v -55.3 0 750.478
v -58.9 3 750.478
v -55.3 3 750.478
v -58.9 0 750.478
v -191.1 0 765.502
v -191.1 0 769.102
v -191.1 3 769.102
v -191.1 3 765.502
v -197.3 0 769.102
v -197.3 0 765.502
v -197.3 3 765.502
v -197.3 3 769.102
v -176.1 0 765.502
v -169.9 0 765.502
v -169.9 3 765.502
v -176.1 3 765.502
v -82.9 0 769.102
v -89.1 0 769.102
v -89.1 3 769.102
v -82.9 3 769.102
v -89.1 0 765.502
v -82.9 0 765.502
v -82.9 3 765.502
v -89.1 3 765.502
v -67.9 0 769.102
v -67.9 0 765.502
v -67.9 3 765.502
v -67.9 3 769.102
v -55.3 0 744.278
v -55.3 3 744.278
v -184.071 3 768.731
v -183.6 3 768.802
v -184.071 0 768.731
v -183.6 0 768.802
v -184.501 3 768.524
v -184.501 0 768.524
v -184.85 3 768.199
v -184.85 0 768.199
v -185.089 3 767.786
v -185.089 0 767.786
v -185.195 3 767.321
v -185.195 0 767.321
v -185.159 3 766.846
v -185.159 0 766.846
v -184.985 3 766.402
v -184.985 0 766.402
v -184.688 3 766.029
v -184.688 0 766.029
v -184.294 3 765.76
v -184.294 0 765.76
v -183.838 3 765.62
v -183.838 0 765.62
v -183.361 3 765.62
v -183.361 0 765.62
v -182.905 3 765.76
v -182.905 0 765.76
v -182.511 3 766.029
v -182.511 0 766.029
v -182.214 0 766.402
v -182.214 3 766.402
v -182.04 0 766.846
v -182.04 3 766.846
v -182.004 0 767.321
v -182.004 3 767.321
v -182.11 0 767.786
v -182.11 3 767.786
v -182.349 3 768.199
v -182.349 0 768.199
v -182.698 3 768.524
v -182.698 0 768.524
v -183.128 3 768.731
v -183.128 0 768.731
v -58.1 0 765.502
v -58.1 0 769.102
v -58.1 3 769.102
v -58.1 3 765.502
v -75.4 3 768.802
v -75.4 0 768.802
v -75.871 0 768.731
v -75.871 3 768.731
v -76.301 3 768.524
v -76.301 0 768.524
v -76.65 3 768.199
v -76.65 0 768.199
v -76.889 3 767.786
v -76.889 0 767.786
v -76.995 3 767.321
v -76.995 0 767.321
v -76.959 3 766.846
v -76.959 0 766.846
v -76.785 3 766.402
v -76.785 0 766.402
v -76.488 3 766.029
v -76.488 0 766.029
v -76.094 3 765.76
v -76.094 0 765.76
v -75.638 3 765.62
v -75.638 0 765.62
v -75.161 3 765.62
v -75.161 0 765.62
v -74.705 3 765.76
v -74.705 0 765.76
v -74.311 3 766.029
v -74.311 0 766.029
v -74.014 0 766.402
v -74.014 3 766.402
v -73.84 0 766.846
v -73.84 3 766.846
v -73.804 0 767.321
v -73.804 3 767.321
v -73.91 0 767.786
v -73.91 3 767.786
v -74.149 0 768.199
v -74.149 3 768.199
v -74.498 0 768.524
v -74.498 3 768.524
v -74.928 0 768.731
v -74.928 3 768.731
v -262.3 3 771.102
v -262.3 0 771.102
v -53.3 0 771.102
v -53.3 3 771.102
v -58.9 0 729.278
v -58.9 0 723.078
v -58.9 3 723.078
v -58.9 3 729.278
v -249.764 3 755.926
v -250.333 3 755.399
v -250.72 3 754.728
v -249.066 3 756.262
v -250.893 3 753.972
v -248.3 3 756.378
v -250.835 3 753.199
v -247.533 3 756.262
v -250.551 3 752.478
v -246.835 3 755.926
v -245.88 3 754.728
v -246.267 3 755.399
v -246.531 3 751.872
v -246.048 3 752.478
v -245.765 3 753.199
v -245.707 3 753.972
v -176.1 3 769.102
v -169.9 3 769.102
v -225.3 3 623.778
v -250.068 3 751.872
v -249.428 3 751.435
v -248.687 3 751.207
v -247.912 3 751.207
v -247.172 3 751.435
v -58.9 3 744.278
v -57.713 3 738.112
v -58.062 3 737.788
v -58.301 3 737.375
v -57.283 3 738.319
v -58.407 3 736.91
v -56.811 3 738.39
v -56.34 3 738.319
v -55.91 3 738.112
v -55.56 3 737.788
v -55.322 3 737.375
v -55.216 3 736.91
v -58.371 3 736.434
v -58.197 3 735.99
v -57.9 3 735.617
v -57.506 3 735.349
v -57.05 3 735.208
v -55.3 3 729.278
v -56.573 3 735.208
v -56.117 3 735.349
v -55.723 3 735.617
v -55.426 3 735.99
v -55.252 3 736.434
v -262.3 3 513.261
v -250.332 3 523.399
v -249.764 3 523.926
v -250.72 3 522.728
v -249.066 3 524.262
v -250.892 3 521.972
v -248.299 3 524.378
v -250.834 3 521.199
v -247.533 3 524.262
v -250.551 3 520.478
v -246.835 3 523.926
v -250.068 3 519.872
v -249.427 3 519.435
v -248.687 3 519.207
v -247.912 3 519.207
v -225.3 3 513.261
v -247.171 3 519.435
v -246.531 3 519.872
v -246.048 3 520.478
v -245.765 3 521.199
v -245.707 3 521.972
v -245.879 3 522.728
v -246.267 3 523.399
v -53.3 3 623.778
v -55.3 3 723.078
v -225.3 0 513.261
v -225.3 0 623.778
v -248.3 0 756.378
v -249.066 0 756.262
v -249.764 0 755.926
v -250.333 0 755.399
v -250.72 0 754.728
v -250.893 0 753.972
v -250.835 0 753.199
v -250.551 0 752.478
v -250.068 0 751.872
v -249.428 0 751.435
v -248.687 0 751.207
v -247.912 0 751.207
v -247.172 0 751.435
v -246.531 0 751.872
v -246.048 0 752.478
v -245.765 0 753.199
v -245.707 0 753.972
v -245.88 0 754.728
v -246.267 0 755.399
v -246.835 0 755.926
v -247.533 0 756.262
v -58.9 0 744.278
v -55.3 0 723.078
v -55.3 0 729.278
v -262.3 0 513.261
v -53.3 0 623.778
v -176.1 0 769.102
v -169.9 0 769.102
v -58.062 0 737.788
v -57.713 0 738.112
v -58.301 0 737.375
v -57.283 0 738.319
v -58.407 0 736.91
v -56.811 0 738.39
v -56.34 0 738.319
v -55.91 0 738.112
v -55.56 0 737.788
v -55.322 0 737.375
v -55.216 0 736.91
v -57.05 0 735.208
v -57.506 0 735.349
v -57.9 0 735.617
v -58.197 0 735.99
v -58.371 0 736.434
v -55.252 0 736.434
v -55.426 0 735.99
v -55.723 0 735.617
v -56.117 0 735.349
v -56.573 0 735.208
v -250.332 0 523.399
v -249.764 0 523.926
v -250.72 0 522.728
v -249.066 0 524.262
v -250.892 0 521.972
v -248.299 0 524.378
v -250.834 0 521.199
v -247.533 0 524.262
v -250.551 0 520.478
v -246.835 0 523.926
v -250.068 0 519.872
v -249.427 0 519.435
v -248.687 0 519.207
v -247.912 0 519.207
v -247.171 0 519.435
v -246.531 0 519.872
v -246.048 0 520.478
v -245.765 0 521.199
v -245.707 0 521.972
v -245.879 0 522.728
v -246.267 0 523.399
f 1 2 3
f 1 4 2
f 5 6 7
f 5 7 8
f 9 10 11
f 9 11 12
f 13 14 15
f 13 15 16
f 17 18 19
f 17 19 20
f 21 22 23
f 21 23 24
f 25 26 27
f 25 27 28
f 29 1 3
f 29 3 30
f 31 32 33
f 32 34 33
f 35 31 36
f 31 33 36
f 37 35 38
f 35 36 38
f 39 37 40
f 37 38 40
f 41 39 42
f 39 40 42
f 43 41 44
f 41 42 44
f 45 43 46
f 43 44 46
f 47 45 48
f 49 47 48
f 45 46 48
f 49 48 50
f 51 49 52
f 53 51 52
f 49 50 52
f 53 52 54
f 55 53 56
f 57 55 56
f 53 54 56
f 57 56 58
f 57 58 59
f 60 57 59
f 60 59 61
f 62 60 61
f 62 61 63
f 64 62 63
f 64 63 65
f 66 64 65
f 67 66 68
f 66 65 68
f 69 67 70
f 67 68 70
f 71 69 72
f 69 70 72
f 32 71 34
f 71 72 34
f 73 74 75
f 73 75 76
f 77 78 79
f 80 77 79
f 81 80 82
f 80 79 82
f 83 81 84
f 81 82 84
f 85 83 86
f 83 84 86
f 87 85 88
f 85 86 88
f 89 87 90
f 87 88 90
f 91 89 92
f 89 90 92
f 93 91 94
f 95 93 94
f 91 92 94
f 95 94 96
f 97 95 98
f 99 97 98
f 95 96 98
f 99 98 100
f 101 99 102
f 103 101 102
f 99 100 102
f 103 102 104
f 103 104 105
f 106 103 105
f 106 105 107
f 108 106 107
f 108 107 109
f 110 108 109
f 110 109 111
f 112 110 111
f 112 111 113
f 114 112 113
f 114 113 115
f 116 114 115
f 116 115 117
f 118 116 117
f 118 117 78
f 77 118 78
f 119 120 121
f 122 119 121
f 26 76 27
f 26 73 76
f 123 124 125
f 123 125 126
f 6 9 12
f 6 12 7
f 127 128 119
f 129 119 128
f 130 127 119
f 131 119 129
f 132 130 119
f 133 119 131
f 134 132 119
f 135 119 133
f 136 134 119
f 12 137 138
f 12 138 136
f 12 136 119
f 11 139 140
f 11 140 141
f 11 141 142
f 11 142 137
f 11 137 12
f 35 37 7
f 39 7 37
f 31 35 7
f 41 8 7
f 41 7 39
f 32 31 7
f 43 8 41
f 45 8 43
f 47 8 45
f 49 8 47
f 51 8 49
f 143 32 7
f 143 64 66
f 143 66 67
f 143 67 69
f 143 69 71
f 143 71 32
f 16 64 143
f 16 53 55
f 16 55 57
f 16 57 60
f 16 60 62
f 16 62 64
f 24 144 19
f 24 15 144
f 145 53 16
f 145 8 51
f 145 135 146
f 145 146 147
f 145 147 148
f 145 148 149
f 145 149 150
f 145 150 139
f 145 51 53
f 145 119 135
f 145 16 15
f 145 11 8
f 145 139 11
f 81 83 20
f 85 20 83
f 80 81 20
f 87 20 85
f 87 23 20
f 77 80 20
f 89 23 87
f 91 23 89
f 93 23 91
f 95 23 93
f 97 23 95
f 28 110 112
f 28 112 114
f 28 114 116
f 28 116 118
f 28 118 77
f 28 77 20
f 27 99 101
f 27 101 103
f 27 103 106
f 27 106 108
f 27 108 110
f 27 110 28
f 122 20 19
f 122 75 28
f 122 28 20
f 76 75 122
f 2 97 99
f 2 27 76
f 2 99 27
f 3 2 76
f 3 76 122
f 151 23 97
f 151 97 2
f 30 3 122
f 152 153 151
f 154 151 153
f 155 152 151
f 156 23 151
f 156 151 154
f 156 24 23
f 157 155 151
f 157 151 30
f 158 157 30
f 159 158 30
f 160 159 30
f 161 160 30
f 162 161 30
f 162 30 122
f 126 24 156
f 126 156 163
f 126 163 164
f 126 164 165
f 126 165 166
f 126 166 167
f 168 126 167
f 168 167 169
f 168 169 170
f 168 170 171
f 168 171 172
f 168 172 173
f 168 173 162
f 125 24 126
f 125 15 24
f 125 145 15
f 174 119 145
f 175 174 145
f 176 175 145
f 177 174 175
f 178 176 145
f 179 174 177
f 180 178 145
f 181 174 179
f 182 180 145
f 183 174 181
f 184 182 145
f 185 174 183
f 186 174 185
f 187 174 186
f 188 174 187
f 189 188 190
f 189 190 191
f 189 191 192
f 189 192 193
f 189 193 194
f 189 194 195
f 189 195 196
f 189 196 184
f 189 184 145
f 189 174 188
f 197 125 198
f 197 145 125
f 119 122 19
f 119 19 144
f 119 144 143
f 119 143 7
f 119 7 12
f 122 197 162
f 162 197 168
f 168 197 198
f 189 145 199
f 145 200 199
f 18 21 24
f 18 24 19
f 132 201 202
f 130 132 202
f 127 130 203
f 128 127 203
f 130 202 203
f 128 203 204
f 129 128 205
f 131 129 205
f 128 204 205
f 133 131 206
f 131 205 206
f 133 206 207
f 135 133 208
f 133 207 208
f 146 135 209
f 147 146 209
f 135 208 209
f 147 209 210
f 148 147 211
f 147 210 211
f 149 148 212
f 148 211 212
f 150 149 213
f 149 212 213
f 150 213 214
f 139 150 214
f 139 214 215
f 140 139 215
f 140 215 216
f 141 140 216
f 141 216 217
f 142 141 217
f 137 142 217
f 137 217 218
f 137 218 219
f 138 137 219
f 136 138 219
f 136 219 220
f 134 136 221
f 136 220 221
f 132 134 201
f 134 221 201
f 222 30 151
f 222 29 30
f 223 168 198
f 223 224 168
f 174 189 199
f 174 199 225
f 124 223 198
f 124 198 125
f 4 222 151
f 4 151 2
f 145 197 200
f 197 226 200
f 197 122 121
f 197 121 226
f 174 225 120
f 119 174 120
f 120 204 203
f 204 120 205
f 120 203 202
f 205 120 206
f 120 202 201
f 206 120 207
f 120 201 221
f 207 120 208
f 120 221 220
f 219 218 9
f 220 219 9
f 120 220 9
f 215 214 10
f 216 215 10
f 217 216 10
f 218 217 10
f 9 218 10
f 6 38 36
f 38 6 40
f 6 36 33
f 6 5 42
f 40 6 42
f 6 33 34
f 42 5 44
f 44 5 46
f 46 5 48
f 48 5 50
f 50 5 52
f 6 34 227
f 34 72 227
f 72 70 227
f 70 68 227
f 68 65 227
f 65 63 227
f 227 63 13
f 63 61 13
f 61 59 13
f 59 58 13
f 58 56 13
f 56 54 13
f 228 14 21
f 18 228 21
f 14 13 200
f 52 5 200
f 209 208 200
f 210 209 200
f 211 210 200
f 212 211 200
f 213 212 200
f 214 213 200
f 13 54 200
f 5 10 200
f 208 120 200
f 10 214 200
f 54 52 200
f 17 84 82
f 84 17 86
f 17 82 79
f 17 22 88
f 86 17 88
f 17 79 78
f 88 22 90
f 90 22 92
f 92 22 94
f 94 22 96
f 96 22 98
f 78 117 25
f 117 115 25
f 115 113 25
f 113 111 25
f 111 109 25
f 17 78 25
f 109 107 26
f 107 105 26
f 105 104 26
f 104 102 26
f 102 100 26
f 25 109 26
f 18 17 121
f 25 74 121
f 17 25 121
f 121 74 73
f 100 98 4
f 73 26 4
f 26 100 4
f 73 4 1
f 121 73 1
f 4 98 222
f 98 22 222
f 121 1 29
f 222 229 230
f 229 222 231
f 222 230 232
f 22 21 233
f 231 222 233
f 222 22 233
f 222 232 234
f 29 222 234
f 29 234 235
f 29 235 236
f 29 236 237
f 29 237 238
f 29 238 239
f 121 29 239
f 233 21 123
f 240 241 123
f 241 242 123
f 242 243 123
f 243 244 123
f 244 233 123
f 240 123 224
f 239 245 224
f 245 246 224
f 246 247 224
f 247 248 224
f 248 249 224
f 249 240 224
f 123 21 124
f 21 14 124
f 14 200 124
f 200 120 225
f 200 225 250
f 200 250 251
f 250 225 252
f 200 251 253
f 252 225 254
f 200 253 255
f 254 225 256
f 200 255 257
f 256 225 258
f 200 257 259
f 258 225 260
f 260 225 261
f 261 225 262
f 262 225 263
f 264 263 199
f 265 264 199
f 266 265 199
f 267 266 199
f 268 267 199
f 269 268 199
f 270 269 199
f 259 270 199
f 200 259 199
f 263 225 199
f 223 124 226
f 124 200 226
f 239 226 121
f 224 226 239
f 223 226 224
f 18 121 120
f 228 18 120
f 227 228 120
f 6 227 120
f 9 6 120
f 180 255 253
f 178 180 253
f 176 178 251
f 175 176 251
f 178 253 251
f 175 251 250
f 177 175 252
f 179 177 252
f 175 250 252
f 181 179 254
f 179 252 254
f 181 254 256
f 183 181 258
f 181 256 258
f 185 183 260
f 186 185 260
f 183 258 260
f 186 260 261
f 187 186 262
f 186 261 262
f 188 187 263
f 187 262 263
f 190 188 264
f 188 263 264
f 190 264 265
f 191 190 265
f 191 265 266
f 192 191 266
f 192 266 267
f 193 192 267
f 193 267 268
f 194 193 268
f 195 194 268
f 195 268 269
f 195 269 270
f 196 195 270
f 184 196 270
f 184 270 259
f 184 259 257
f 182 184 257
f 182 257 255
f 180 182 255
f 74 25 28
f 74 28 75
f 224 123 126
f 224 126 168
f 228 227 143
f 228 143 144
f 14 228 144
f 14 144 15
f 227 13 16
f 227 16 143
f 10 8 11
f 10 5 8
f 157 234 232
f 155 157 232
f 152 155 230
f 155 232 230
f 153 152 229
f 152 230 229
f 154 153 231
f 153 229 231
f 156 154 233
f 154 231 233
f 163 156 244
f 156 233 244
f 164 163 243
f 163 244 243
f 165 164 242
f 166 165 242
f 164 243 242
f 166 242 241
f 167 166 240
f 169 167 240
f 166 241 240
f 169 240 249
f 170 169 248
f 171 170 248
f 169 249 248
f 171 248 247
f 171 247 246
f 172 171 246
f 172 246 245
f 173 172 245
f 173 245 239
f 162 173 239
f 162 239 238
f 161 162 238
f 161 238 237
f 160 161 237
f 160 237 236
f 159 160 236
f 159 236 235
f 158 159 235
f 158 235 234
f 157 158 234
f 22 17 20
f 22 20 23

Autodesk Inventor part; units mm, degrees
ref_plane "YZ Plane" through (0, 0, 0) normal (1, 0, 0) x (0, 1, 0)
ref_plane "XZ Plane" through (0, 0, 0) normal (0, 1, 0) x (-1, 0, 0)
ref_plane "XY Plane" through (0, 0, 0) normal (0, 0, 1) x (1, 0, 0)
sketch "Sketch1" plane through (0, 0, 0) normal (0, 1, 0) x (-1, 0, 0)
  line L0 (55.2995, 771.1017) -> (53.2995, 771.1017)
  line L1 (53.2995, 771.1017) -> (53.2995, 769.1016)
  line L2 (53.2995, 769.1016) -> (53.2995, 481.7779)
  line L3 (53.2995, 481.7779) -> (65.4836, 481.7779)
  line L4 (65.4836, 481.7779) -> (65.4836, 475.7779)
  line L5 (65.4836, 475.7779) -> (70.4836, 475.7779)
  line L6 (70.4836, 475.7779) -> (70.4836, 481.7779)
  line L7 (70.4836, 481.7779) -> (71.2995, 481.7779)
  line L8 (71.2995, 481.7779) -> (71.2995, 623.7779)
  line L9 (71.2995, 623.7779) -> (225.2995, 623.7779)
  line L10 (225.2995, 623.7779) -> (225.2995, 481.7779)
  line L11 (225.2995, 481.7779) -> (234.2995, 481.7779)
  line L12 (234.2995, 481.7779) -> (234.2995, 476.778)
  line L13 (234.2995, 476.778) -> (262.2995, 476.778)
  line L14 (262.2995, 476.778) -> (262.2995, 771.1017)
  line L15 (262.2995, 771.1017) -> (55.2995, 771.1017)
  line L16 (58.3449, 526.6921) -> (58.1851, 527.078)
  line L17 (58.1851, 527.078) -> (57.9308, 527.4094)
  line L18 (57.9308, 527.4094) -> (57.5994, 527.6636)
  line L19 (57.5994, 527.6636) -> (57.2135, 527.8234)
  line L20 (57.2135, 527.8234) -> (56.7994, 527.878)
  line L21 (56.7994, 527.878) -> (56.3853, 527.8234)
  line L22 (56.3853, 527.8234) -> (55.9994, 527.6636)
  line L23 (55.9994, 527.6636) -> (55.668, 527.4093)
  line L24 (55.668, 527.4093) -> (55.4138, 527.0779)
  line L25 (55.4138, 527.0779) -> (55.254, 526.692)
  line L26 (55.254, 526.692) -> (55.1994, 526.2779)
  line L27 (55.1994, 526.2779) -> (55.254, 525.8638)
  line L28 (55.254, 525.8638) -> (55.4138, 525.4779)
  line L29 (55.4138, 525.4779) -> (55.6681, 525.1465)
  line L30 (55.6681, 525.1465) -> (55.9994, 524.8923)
  line L31 (55.9994, 524.8923) -> (56.3853, 524.7325)
  line L32 (56.3853, 524.7325) -> (56.7992, 524.678)
  line L33 (56.7992, 524.678) -> (57.2135, 524.7325)
  line L34 (57.2135, 524.7325) -> (57.5994, 524.8924)
  line L35 (57.5994, 524.8924) -> (57.9308, 525.1466)
  line L36 (57.9308, 525.1466) -> (58.185, 525.478)
  line L37 (58.185, 525.478) -> (58.3449, 525.864)
  line L38 (58.3449, 525.864) -> (58.3994, 526.2781)
  line L39 (58.3994, 526.2781) -> (58.3449, 526.6921)
  line L40 (185.1711, 767.5014) -> (185.0472, 767.8829)
  line L41 (185.0472, 767.8829) -> (184.8323, 768.2215)
  line L42 (184.8323, 768.2215) -> (184.54, 768.496)
  line L43 (184.54, 768.496) -> (184.1885, 768.6893)
  line L44 (184.1885, 768.6893) -> (183.8, 768.7891)
  line L45 (183.8, 768.7891) -> (183.399, 768.7891)
  line L46 (183.399, 768.7891) -> (183.0105, 768.6893)
  line L47 (183.0105, 768.6893) -> (182.659, 768.4961)
  line L48 (182.659, 768.4961) -> (182.3667, 768.2216)
  line L49 (182.3667, 768.2216) -> (182.1518, 767.8829)
  line L50 (182.1518, 767.8829) -> (182.0278, 767.5015)
  line L51 (182.0278, 767.5015) -> (182.0026, 767.1012)
  line L52 (182.0026, 767.1012) -> (182.0778, 766.7072)
  line L53 (182.0778, 766.7072) -> (182.2485, 766.3443)
  line L54 (182.2485, 766.3443) -> (182.5042, 766.0353)
  line L55 (182.5042, 766.0353) -> (182.8287, 765.7996)
  line L56 (182.8287, 765.7996) -> (183.2016, 765.652)
  line L57 (183.2016, 765.652) -> (183.5994, 765.6017)
  line L58 (183.5994, 765.6017) -> (183.9974, 765.652)
  line L59 (183.9974, 765.652) -> (184.3703, 765.7996)
  line L60 (184.3703, 765.7996) -> (184.6947, 766.0353)
  line L61 (184.6947, 766.0353) -> (184.9504, 766.3444)
  line L62 (184.9504, 766.3444) -> (185.1212, 766.7072)
  line L63 (185.1212, 766.7072) -> (185.1963, 767.1012)
  line L64 (185.1963, 767.1012) -> (185.1711, 767.5014)
  line L65 (76.9712, 767.5015) -> (76.8472, 767.8829)
  line L66 (76.8472, 767.8829) -> (76.6323, 768.2216)
  line L67 (76.6323, 768.2216) -> (76.3399, 768.4961)
  line L68 (76.3399, 768.4961) -> (75.9885, 768.6893)
  line L69 (75.9885, 768.6893) -> (75.6, 768.7891)
  line L70 (75.6, 768.7891) -> (75.199, 768.7891)
  line L71 (75.199, 768.7891) -> (74.8105, 768.6893)
  line L72 (74.8105, 768.6893) -> (74.459, 768.4961)
  line L73 (74.459, 768.4961) -> (74.1667, 768.2216)
  line L74 (74.1667, 768.2216) -> (73.9518, 767.8829)
  line L75 (73.9518, 767.8829) -> (73.8278, 767.5015)
  line L76 (73.8278, 767.5015) -> (73.8027, 767.1012)
  line L77 (73.8027, 767.1012) -> (73.8778, 766.7072)
  line L78 (73.8778, 766.7072) -> (74.0486, 766.3444)
  line L79 (74.0486, 766.3444) -> (74.3042, 766.0353)
  line L80 (74.3042, 766.0353) -> (74.6287, 765.7996)
  line L81 (74.6287, 765.7996) -> (75.0016, 765.652)
  line L82 (75.0016, 765.652) -> (75.3995, 765.6017)
  line L83 (75.3995, 765.6017) -> (75.7974, 765.652)
  line L84 (75.7974, 765.652) -> (76.1703, 765.7996)
  line L85 (76.1703, 765.7996) -> (76.4947, 766.0353)
  line L86 (76.4947, 766.0353) -> (76.7504, 766.3444)
  line L87 (76.7504, 766.3444) -> (76.9212, 766.7072)
  line L88 (76.9212, 766.7072) -> (76.9964, 767.1012)
  line L89 (76.9964, 767.1012) -> (76.9712, 767.5015)
  line L90 (250.722, 522.4271) -> (250.4714, 523.032)
  line L91 (250.4714, 523.032) -> (250.0729, 523.5514)
  line L92 (250.0729, 523.5514) -> (249.5534, 523.9499)
  line L93 (249.5534, 523.9499) -> (248.9485, 524.2005)
  line L94 (248.9485, 524.2005) -> (248.2994, 524.286)
  line L95 (248.2994, 524.286) -> (247.6503, 524.2005)
  line L96 (247.6503, 524.2005) -> (247.0454, 523.95)
  line L97 (247.0454, 523.95) -> (246.526, 523.5514)
  line L98 (246.526, 523.5514) -> (246.1275, 523.0319)
  line L99 (246.1275, 523.0319) -> (245.8769, 522.4271)
  line L100 (245.8769, 522.4271) -> (245.7914, 521.778)
  line L101 (245.7914, 521.778) -> (245.8769, 521.1288)
  line L102 (245.8769, 521.1288) -> (246.1275, 520.524)
  line L103 (246.1275, 520.524) -> (246.526, 520.0045)
  line L104 (246.526, 520.0045) -> (247.0455, 519.606)
  line L105 (247.0455, 519.606) -> (247.6504, 519.3555)
  line L106 (247.6504, 519.3555) -> (248.2995, 519.27)
  line L107 (248.2995, 519.27) -> (248.9486, 519.3554)
  line L108 (248.9486, 519.3554) -> (249.5535, 519.606)
  line L109 (249.5535, 519.606) -> (250.0729, 520.0046)
  line L110 (250.0729, 520.0046) -> (250.4714, 520.524)
  line L111 (250.4714, 520.524) -> (250.722, 521.1289)
  line L112 (250.722, 521.1289) -> (250.8075, 521.7779)
  line L113 (250.8075, 521.7779) -> (250.722, 522.4271)
  line L114 (250.7224, 754.4272) -> (250.4718, 755.0321)
  line L115 (250.4718, 755.0321) -> (250.0733, 755.5515)
  line L116 (250.0733, 755.5515) -> (249.5538, 755.95)
  line L117 (249.5538, 755.95) -> (248.9489, 756.2005)
  line L118 (248.9489, 756.2005) -> (248.2998, 756.286)
  line L119 (248.2998, 756.286) -> (247.6507, 756.2006)
  line L120 (247.6507, 756.2006) -> (247.0458, 755.95)
  line L121 (247.0458, 755.95) -> (246.5264, 755.5515)
  line L122 (246.5264, 755.5515) -> (246.1279, 755.032)
  line L123 (246.1279, 755.032) -> (245.8773, 754.4271)
  line L124 (245.8773, 754.4271) -> (245.7918, 753.778)
  line L125 (245.7918, 753.778) -> (245.8773, 753.1288)
  line L126 (245.8773, 753.1288) -> (246.1279, 752.524)
  line L127 (246.1279, 752.524) -> (246.5264, 752.0045)
  line L128 (246.5264, 752.0045) -> (247.0459, 751.606)
  line L129 (247.0459, 751.606) -> (247.6508, 751.3555)
  line L130 (247.6508, 751.3555) -> (248.2999, 751.27)
  line L131 (248.2999, 751.27) -> (248.949, 751.3555)
  line L132 (248.949, 751.3555) -> (249.5539, 751.606)
  line L133 (249.5539, 751.606) -> (250.0737, 752.0049)
  line L134 (250.0737, 752.0049) -> (250.4719, 752.5239)
  line L135 (250.4719, 752.5239) -> (250.7224, 753.1288)
  line L136 (250.7224, 753.1288) -> (250.8079, 753.7777)
  line L137 (250.8079, 753.7777) -> (250.7224, 754.4272)
  line L138 (82.8995, 769.1016) -> (82.8995, 765.5017)
  line L139 (82.8995, 765.5017) -> (89.0995, 765.5017)
  line L140 (89.0995, 765.5017) -> (89.0995, 769.1016)
  line L141 (89.0995, 769.1016) -> (82.8995, 769.1016)
  line L142 (169.8995, 769.1016) -> (169.8995, 765.5017)
  line L143 (169.8995, 765.5017) -> (176.0995, 765.5017)
  line L144 (176.0995, 765.5017) -> (176.0995, 769.1016)
  line L145 (176.0995, 769.1016) -> (169.8995, 769.1016)
  line L146 (191.0995, 769.1016) -> (191.0995, 765.5017)
  line L147 (191.0995, 765.5017) -> (197.2995, 765.5017)
  line L148 (197.2995, 765.5017) -> (197.2995, 769.1016)
  line L149 (197.2995, 769.1016) -> (191.0995, 769.1016)
  line L150 (55.2995, 518.7672) -> (55.2995, 512.5672)
  line L151 (55.2995, 512.5672) -> (58.8995, 512.5672)
  line L152 (58.8995, 512.5672) -> (58.8995, 518.7672)
  line L153 (58.8995, 518.7672) -> (55.2995, 518.7672)
  line L154 (55.2995, 729.278) -> (55.2995, 723.0779)
  line L155 (55.2995, 723.0779) -> (58.8995, 723.0779)
  line L156 (58.8995, 723.0779) -> (58.8995, 729.278)
  line L157 (58.8995, 729.278) -> (55.2995, 729.278)
  line L158 (58.3568, 737.2044) -> (58.197, 737.5902)
  line L159 (58.197, 737.5902) -> (57.9428, 737.9216)
  line L160 (57.9428, 737.9216) -> (57.6114, 738.1758)
  line L161 (57.6114, 738.1758) -> (57.2255, 738.3357)
  line L162 (57.2255, 738.3357) -> (56.8114, 738.3902)
  line L163 (56.8114, 738.3902) -> (56.3972, 738.3357)
  line L164 (56.3972, 738.3357) -> (56.0113, 738.1758)
  line L165 (56.0113, 738.1758) -> (55.68, 737.9216)
  line L166 (55.68, 737.9216) -> (55.4258, 737.5902)
  line L167 (55.4258, 737.5902) -> (55.2659, 737.2043)
  line L168 (55.2659, 737.2043) -> (55.2114, 736.7902)
  line L169 (55.2114, 736.7902) -> (55.2659, 736.3761)
  line L170 (55.2659, 736.3761) -> (55.4257, 735.9902)
  line L171 (55.4257, 735.9902) -> (55.68, 735.6588)
  line L172 (55.68, 735.6588) -> (56.0114, 735.4046)
  line L173 (56.0114, 735.4046) -> (56.3973, 735.2448)
  line L174 (56.3973, 735.2448) -> (56.8114, 735.1902)
  line L175 (56.8114, 735.1902) -> (57.2255, 735.2447)
  line L176 (57.2255, 735.2447) -> (57.6114, 735.4046)
  line L177 (57.6114, 735.4046) -> (57.9427, 735.6588)
  line L178 (57.9427, 735.6588) -> (58.197, 735.9903)
  line L179 (58.197, 735.9903) -> (58.3568, 736.3762)
  line L180 (58.3568, 736.3762) -> (58.4114, 736.7902)
  line L181 (58.4114, 736.7902) -> (58.3568, 737.2044)
  line L182 (58.0995, 769.1016) -> (58.0995, 765.5017)
  line L183 (58.0995, 765.5017) -> (67.8995, 765.5017)
  line L184 (67.8995, 765.5017) -> (67.8995, 769.1016)
  line L185 (67.8995, 769.1016) -> (58.0995, 769.1016)
  line L186 (55.2995, 750.4779) -> (55.2995, 744.2779)
  line L187 (55.2995, 744.2779) -> (58.8995, 744.2779)
  line L188 (58.8995, 744.2779) -> (58.8995, 750.4779)
  line L189 (58.8995, 750.4779) -> (55.2995, 750.4779)
  line L190 (55.2995, 539.9672) -> (55.2995, 533.7672)
  line L191 (55.2995, 533.7672) -> (58.8995, 533.7672)
  line L192 (58.8995, 533.7672) -> (58.8995, 539.9672)
  line L193 (58.8995, 539.9672) -> (55.2995, 539.9672)
  point P0 (0, 0)
extrude "Extrusion1" add sketch "Sketch1" along normal blind 3
sketch "Sketch2" plane through (0, 3, 0) normal (0, 1, 0) x (1, 0, 0)
  line L0 (-58.0995, -769.1016) -> (-67.8995, -769.1016) projected
  line L1 (-67.8995, -769.1016) -> (-67.8995, -765.5017) projected
  line L2 (-67.8995, -765.5017) -> (-58.0995, -765.5017) projected
  line L3 (-58.0995, -765.5017) -> (-58.0995, -769.1016) projected
  line L4 (-55.2995, -729.278) -> (-58.8995, -729.278) projected
  line L5 (-58.8995, -729.278) -> (-58.8995, -723.0779) projected
  line L6 (-58.8995, -723.0779) -> (-55.2995, -723.0779) projected
  line L7 (-55.2995, -723.0779) -> (-55.2995, -729.278) projected
  line L8 (-55.2995, -518.7672) -> (-58.8995, -518.7672) projected
  line L9 (-58.8995, -518.7672) -> (-58.8995, -512.5672) projected
  line L10 (-58.8995, -512.5672) -> (-55.2995, -512.5672) projected
  line L11 (-55.2995, -512.5672) -> (-55.2995, -518.7672) projected
  line L12 (-191.0995, -769.1016) -> (-197.2995, -769.1016) projected
  line L13 (-197.2995, -769.1016) -> (-197.2995, -765.5017) projected
  line L14 (-197.2995, -765.5017) -> (-191.0995, -765.5017) projected
  line L15 (-191.0995, -765.5017) -> (-191.0995, -769.1016) projected
  line L16 (-55.2995, -539.9672) -> (-58.8995, -539.9672) projected
  line L17 (-58.8995, -539.9672) -> (-58.8995, -533.7672) projected
  line L18 (-58.8995, -533.7672) -> (-55.2995, -533.7672) projected
  line L19 (-55.2995, -533.7672) -> (-55.2995, -539.9672) projected
  line L20 (-55.2995, -750.4779) -> (-58.8995, -750.4779) projected
  line L21 (-58.8995, -750.4779) -> (-58.8995, -744.2779) projected
  line L22 (-58.8995, -744.2779) -> (-55.2995, -744.2779) projected
  line L23 (-55.2995, -744.2779) -> (-55.2995, -750.4779) projected
  line L24 (-169.8995, -769.1016) -> (-176.0995, -769.1016) projected
  line L25 (-176.0995, -769.1016) -> (-176.0995, -765.5017) projected
  line L26 (-176.0995, -765.5017) -> (-169.8995, -765.5017) projected
  line L27 (-169.8995, -765.5017) -> (-169.8995, -769.1016) projected
  line L28 (-82.8995, -769.1016) -> (-89.0995, -769.1016) projected
  line L29 (-89.0995, -769.1016) -> (-89.0995, -765.5017) projected
  line L30 (-89.0995, -765.5017) -> (-82.8995, -765.5017) projected
  line L31 (-82.8995, -765.5017) -> (-82.8995, -769.1016) projected
  line L32 (-250.7224, -754.4272) -> (-250.8079, -753.7777) projected
  line L33 (-250.8079, -753.7777) -> (-250.7224, -753.1288) projected
  line L34 (-250.7224, -753.1288) -> (-250.4719, -752.5239) projected
  line L35 (-250.4719, -752.5239) -> (-250.0737, -752.0049) projected
  line L36 (-250.0737, -752.0049) -> (-249.5539, -751.606) projected
  line L37 (-249.5539, -751.606) -> (-248.949, -751.3555) projected
  line L38 (-248.949, -751.3555) -> (-248.2999, -751.27) projected
  line L39 (-248.2999, -751.27) -> (-247.6508, -751.3555) projected
  line L40 (-247.6508, -751.3555) -> (-247.0459, -751.606) projected
  line L41 (-247.0459, -751.606) -> (-246.5264, -752.0045) projected
  line L42 (-246.5264, -752.0045) -> (-246.1279, -752.524) projected
  line L43 (-246.1279, -752.524) -> (-245.8773, -753.1288) projected
  line L44 (-245.8773, -753.1288) -> (-245.7918, -753.778) projected
  line L45 (-245.7918, -753.778) -> (-245.8773, -754.4271) projected
  line L46 (-245.8773, -754.4271) -> (-246.1279, -755.032) projected
  line L47 (-246.1279, -755.032) -> (-246.5264, -755.5515) projected
  line L48 (-246.5264, -755.5515) -> (-247.0458, -755.95) projected
  line L49 (-247.0458, -755.95) -> (-247.6507, -756.2006) projected
  line L50 (-247.6507, -756.2006) -> (-248.2998, -756.286) projected
  line L51 (-248.2998, -756.286) -> (-248.9489, -756.2005) projected
  line L52 (-248.9489, -756.2005) -> (-249.5538, -755.95) projected
  line L53 (-249.5538, -755.95) -> (-250.0733, -755.5515) projected
  line L54 (-250.0733, -755.5515) -> (-250.4718, -755.0321) projected
  line L55 (-250.4718, -755.0321) -> (-250.7224, -754.4272) projected
  line L56 (-250.722, -522.4271) -> (-250.8075, -521.7779) projected
  line L57 (-250.8075, -521.7779) -> (-250.722, -521.1289) projected
  line L58 (-250.722, -521.1289) -> (-250.4714, -520.524) projected
  line L59 (-250.4714, -520.524) -> (-250.0729, -520.0046) projected
  line L60 (-250.0729, -520.0046) -> (-249.5535, -519.606) projected
  line L61 (-249.5535, -519.606) -> (-248.9486, -519.3554) projected
  line L62 (-248.9486, -519.3554) -> (-248.2995, -519.27) projected
  line L63 (-248.2995, -519.27) -> (-247.6504, -519.3555) projected
  line L64 (-247.6504, -519.3555) -> (-247.0455, -519.606) projected
  line L65 (-247.0455, -519.606) -> (-246.526, -520.0045) projected
  line L66 (-246.526, -520.0045) -> (-246.1275, -520.524) projected
  line L67 (-246.1275, -520.524) -> (-245.8769, -521.1288) projected
  line L68 (-245.8769, -521.1288) -> (-245.7914, -521.778) projected
  line L69 (-245.7914, -521.778) -> (-245.8769, -522.4271) projected
  line L70 (-245.8769, -522.4271) -> (-246.1275, -523.0319) projected
  line L71 (-246.1275, -523.0319) -> (-246.526, -523.5514) projected
  line L72 (-246.526, -523.5514) -> (-247.0454, -523.95) projected
  line L73 (-247.0454, -523.95) -> (-247.6503, -524.2005) projected
  line L74 (-247.6503, -524.2005) -> (-248.2994, -524.286) projected
  line L75 (-248.2994, -524.286) -> (-248.9485, -524.2005) projected
  line L76 (-248.9485, -524.2005) -> (-249.5534, -523.9499) projected
  line L77 (-249.5534, -523.9499) -> (-250.0729, -523.5514) projected
  line L78 (-250.0729, -523.5514) -> (-250.4714, -523.032) projected
  line L79 (-250.4714, -523.032) -> (-250.722, -522.4271) projected
  line L80 (-76.9712, -767.5015) -> (-76.9964, -767.1012) projected
  line L81 (-76.9964, -767.1012) -> (-76.9212, -766.7072) projected
  line L82 (-76.9212, -766.7072) -> (-76.7504, -766.3444) projected
  line L83 (-76.7504, -766.3444) -> (-76.4947, -766.0353) projected
  line L84 (-76.4947, -766.0353) -> (-76.1703, -765.7996) projected
  line L85 (-76.1703, -765.7996) -> (-75.7974, -765.652) projected
  line L86 (-75.7974, -765.652) -> (-75.3995, -765.6017) projected
  line L87 (-75.3995, -765.6017) -> (-75.0016, -765.652) projected
  line L88 (-75.0016, -765.652) -> (-74.6287, -765.7996) projected
  line L89 (-74.6287, -765.7996) -> (-74.3042, -766.0353) projected
  line L90 (-74.3042, -766.0353) -> (-74.0486, -766.3444) projected
  line L91 (-74.0486, -766.3444) -> (-73.8778, -766.7072) projected
  line L92 (-73.8778, -766.7072) -> (-73.8027, -767.1012) projected
  line L93 (-73.8027, -767.1012) -> (-73.8278, -767.5015) projected
  line L94 (-73.8278, -767.5015) -> (-73.9518, -767.8829) projected
  line L95 (-73.9518, -767.8829) -> (-74.1667, -768.2216) projected
  line L96 (-74.1667, -768.2216) -> (-74.459, -768.4961) projected
  line L97 (-74.459, -768.4961) -> (-74.8105, -768.6893) projected
  line L98 (-74.8105, -768.6893) -> (-75.199, -768.7891) projected
  line L99 (-75.199, -768.7891) -> (-75.6, -768.7891) projected
  line L100 (-75.6, -768.7891) -> (-75.9885, -768.6893) projected
  line L101 (-75.9885, -768.6893) -> (-76.3399, -768.4961) projected
  line L102 (-76.3399, -768.4961) -> (-76.6323, -768.2216) projected
  line L103 (-76.6323, -768.2216) -> (-76.8472, -767.8829) projected
  line L104 (-76.8472, -767.8829) -> (-76.9712, -767.5015) projected
  line L105 (-185.1711, -767.5014) -> (-185.1963, -767.1012) projected
  line L106 (-185.1963, -767.1012) -> (-185.1212, -766.7072) projected
  line L107 (-185.1212, -766.7072) -> (-184.9504, -766.3444) projected
  line L108 (-184.9504, -766.3444) -> (-184.6947, -766.0353) projected
  line L109 (-184.6947, -766.0353) -> (-184.3703, -765.7996) projected
  line L110 (-184.3703, -765.7996) -> (-183.9974, -765.652) projected
  line L111 (-183.9974, -765.652) -> (-183.5994, -765.6017) projected
  line L112 (-183.5994, -765.6017) -> (-183.2016, -765.652) projected
  line L113 (-183.2016, -765.652) -> (-182.8287, -765.7996) projected
  line L114 (-182.8287, -765.7996) -> (-182.5042, -766.0353) projected
  line L115 (-182.5042, -766.0353) -> (-182.2485, -766.3443) projected
  line L116 (-182.2485, -766.3443) -> (-182.0778, -766.7072) projected
  line L117 (-182.0778, -766.7072) -> (-182.0026, -767.1012) projected
  line L118 (-182.0026, -767.1012) -> (-182.0278, -767.5015) projected
  line L119 (-182.0278, -767.5015) -> (-182.1518, -767.8829) projected
  line L120 (-182.1518, -767.8829) -> (-182.3667, -768.2216) projected
  line L121 (-182.3667, -768.2216) -> (-182.659, -768.4961) projected
  line L122 (-182.659, -768.4961) -> (-183.0105, -768.6893) projected
  line L123 (-183.0105, -768.6893) -> (-183.399, -768.7891) projected
  line L124 (-183.399, -768.7891) -> (-183.8, -768.7891) projected
  line L125 (-183.8, -768.7891) -> (-184.1885, -768.6893) projected
  line L126 (-184.1885, -768.6893) -> (-184.54, -768.496) projected
  line L127 (-184.54, -768.496) -> (-184.8323, -768.2215) projected
  line L128 (-184.8323, -768.2215) -> (-185.0472, -767.8829) projected
  line L129 (-185.0472, -767.8829) -> (-185.1711, -767.5014) projected
  line L130 (-58.3568, -737.2044) -> (-58.4114, -736.7902) projected
  line L131 (-58.4114, -736.7902) -> (-58.3568, -736.3762) projected
  line L132 (-58.3568, -736.3762) -> (-58.197, -735.9903) projected
  line L133 (-58.197, -735.9903) -> (-57.9427, -735.6588) projected
  line L134 (-57.9427, -735.6588) -> (-57.6114, -735.4046) projected
  line L135 (-57.6114, -735.4046) -> (-57.2255, -735.2447) projected
  line L136 (-57.2255, -735.2447) -> (-56.8114, -735.1902) projected
  line L137 (-56.8114, -735.1902) -> (-56.3973, -735.2448) projected
  line L138 (-56.3973, -735.2448) -> (-56.0114, -735.4046) projected
  line L139 (-56.0114, -735.4046) -> (-55.68, -735.6588) projected
  line L140 (-55.68, -735.6588) -> (-55.4257, -735.9902) projected
  line L141 (-55.4257, -735.9902) -> (-55.2659, -736.3761) projected
  line L142 (-55.2659, -736.3761) -> (-55.2114, -736.7902) projected
  line L143 (-55.2114, -736.7902) -> (-55.2659, -737.2043) projected
  line L144 (-55.2659, -737.2043) -> (-55.4258, -737.5902) projected
  line L145 (-55.4258, -737.5902) -> (-55.68, -737.9216) projected
  line L146 (-55.68, -737.9216) -> (-56.0113, -738.1758) projected
  line L147 (-56.0113, -738.1758) -> (-56.3972, -738.3357) projected
  line L148 (-56.3972, -738.3357) -> (-56.8114, -738.3902) projected
  line L149 (-56.8114, -738.3902) -> (-57.2255, -738.3357) projected
  line L150 (-57.2255, -738.3357) -> (-57.6114, -738.1758) projected
  line L151 (-57.6114, -738.1758) -> (-57.9428, -737.9216) projected
  line L152 (-57.9428, -737.9216) -> (-58.197, -737.5902) projected
  line L153 (-58.197, -737.5902) -> (-58.3568, -737.2044) projected
  line L154 (-58.3449, -526.6921) -> (-58.3994, -526.2781) projected
  line L155 (-58.3994, -526.2781) -> (-58.3449, -525.864) projected
  line L156 (-58.3449, -525.864) -> (-58.185, -525.478) projected
  line L157 (-58.185, -525.478) -> (-57.9308, -525.1466) projected
  line L158 (-57.9308, -525.1466) -> (-57.5994, -524.8924) projected
  line L159 (-57.5994, -524.8924) -> (-57.2135, -524.7325) projected
  line L160 (-57.2135, -524.7325) -> (-56.7992, -524.678) projected
  line L161 (-56.7992, -524.678) -> (-56.3853, -524.7325) projected
  line L162 (-56.3853, -524.7325) -> (-55.9994, -524.8923) projected
  line L163 (-55.9994, -524.8923) -> (-55.6681, -525.1465) projected
  line L164 (-55.6681, -525.1465) -> (-55.4138, -525.4779) projected
  line L165 (-55.4138, -525.4779) -> (-55.254, -525.8638) projected
  line L166 (-55.254, -525.8638) -> (-55.1994, -526.2779) projected
  line L167 (-55.1994, -526.2779) -> (-55.254, -526.692) projected
  line L168 (-55.254, -526.692) -> (-55.4138, -527.0779) projected
  line L169 (-55.4138, -527.0779) -> (-55.668, -527.4093) projected
  line L170 (-55.668, -527.4093) -> (-55.9994, -527.6636) projected
  line L171 (-55.9994, -527.6636) -> (-56.3853, -527.8234) projected
  line L172 (-56.3853, -527.8234) -> (-56.7994, -527.878) projected
  line L173 (-56.7994, -527.878) -> (-57.2135, -527.8234) projected
  line L174 (-57.2135, -527.8234) -> (-57.5994, -527.6636) projected
  line L175 (-57.5994, -527.6636) -> (-57.9308, -527.4094) projected
  line L176 (-57.9308, -527.4094) -> (-58.1851, -527.078) projected
  line L177 (-58.1851, -527.078) -> (-58.3449, -526.6921) projected
  line L178 (-262.2995, -771.1017) -> (-53.2995, -771.1017) projected
  line L179 (-53.2995, -771.1017) -> (-53.2995, -481.7779) projected
  line L180 (-53.2995, -481.7779) -> (-65.4836, -481.7779) projected
  line L181 (-65.4836, -481.7779) -> (-65.4836, -475.7779) projected
  line L182 (-65.4836, -475.7779) -> (-70.4836, -475.7779) projected
  line L183 (-70.4836, -475.7779) -> (-70.4836, -481.7779) projected
  line L184 (-70.4836, -481.7779) -> (-71.2995, -481.7779) projected
  line L185 (-71.2995, -481.7779) -> (-71.2995, -623.7779) projected
  line L186 (-71.2995, -623.7779) -> (-225.2995, -623.7779) projected
  line L187 (-225.2995, -623.7779) -> (-225.2995, -481.7779) projected
  line L188 (-225.2995, -481.7779) -> (-234.2995, -481.7779) projected
  line L189 (-234.2995, -481.7779) -> (-234.2995, -476.778) projected
  line L190 (-234.2995, -476.778) -> (-262.2995, -476.778) projected
  line L191 (-262.2995, -476.778) -> (-262.2995, -771.1017) projected
  circle A0 centre (-75.3995, -767.2017) radius 1.5874
  circle A1 centre (-183.5995, -767.2017) radius 1.5874
  circle A2 centre (-56.8114, -736.7902) radius 1.5863
  circle A3 centre (-56.7995, -526.278) radius 1.5862
  point P0 (0, 0)
hole "Hole1" at (-56.7995, 3, 526.278) at (-56.8114, 3, 736.7902) at (-75.3995, 3, 767.2017) at (-183.5995, 3, 767.2017) direction (0, -1, 0) diameter 3.2 end through all
sketch "Sketch5" plane through (0, 3, 0) normal (0, 1, 0) x (1, 0, 0)
  line L0 (-247.6507, -756.2006) -> (-247.0458, -755.95) projected
  line L1 (-250.0733, -755.5515) -> (-249.5538, -755.95) projected
  line L2 (-248.949, -751.3555) -> (-248.2999, -751.27) projected
  line L3 (-248.9486, -519.3554) -> (-248.2995, -519.27) projected
  line L4 (-249.5534, -523.9499) -> (-250.0729, -523.5514) projected
  line L5 (-246.526, -523.5514) -> (-247.0454, -523.95) projected
  circle A0 centre (-248.2998, -753.778) radius 2.4866
  circle A1 centre (-248.2994, -521.778) radius 2.4866
  point P0 (0, 0)
hole "Hole2" at (-248.2998, 3, 753.778) at (-248.2994, 3, 521.778) direction (0, -1, 0) diameter 5.2 end through all
sketch "Sketch6" plane through (0, 3, 0) normal (0, 1, 0) x (1, 0, 0)
  line L0 (-71.2995, -481.7779) -> (-71.2995, -623.7779) projected
  line L1 (-71.2995, -481.7779) -> (-53.2995, -481.7779)
  line L2 (-53.2995, -481.7779) -> (-53.2995, -455.7908)
  line L3 (-53.2995, -455.7908) -> (-71.2995, -455.7908)
  line L4 (-71.2995, -455.7908) -> (-71.2995, -481.7779)
  point P0 (0, 0)
extrude "Extrusion2" add sketch "Sketch6" against normal blind 3
sketch "Sketch7" plane through (0, 3, 0) normal (0, 1, 0) x (1, 0, 0)
  circle A0 centre (-62.3818, -460.5756) radius 2.6
  point P0 (0, 0)
  point P1 (-187.2996, -460.5756)
  dimension "d18" = 5.2
extrude "Extrusion3" cut sketch "Sketch7" against normal through all
sketch "Sketch8" plane through (0, 3, 0) normal (0, 1, 0) x (1, 0, 0)
  line L0 (-221.4165, -513.2612) -> (-270.0696, -513.2612)
  line L1 (-270.0696, -513.2612) -> (-270.0696, -464.0531)
  line L2 (-270.0696, -464.0531) -> (-221.4165, -464.0531)
  line L3 (-221.4165, -464.0531) -> (-221.4165, -513.2612)
  point P0 (0, 0)
  point P1 (-236.6995, -510.7779)
extrude "Extrusion4" cut sketch "Sketch8" against normal blind 3
sketch "Sketch9" plane through (0, 3, 0) normal (0, 1, 0) x (1, 0, 0)
  line L0 (-71.2995, -623.7779) -> (-25.9421, -623.7779)
  line L1 (-25.9421, -623.7779) -> (-25.9421, -372.5945)
  line L2 (-25.9421, -372.5945) -> (-71.2995, -372.5945)
  line L3 (-71.2995, -372.5945) -> (-71.2995, -623.7779)
  point P0 (0, 0)
extrude "Extrusion5" cut sketch "Sketch9" against normal through all
properties part number "EE PSU TOP" material "Polycarbonate, Green"
